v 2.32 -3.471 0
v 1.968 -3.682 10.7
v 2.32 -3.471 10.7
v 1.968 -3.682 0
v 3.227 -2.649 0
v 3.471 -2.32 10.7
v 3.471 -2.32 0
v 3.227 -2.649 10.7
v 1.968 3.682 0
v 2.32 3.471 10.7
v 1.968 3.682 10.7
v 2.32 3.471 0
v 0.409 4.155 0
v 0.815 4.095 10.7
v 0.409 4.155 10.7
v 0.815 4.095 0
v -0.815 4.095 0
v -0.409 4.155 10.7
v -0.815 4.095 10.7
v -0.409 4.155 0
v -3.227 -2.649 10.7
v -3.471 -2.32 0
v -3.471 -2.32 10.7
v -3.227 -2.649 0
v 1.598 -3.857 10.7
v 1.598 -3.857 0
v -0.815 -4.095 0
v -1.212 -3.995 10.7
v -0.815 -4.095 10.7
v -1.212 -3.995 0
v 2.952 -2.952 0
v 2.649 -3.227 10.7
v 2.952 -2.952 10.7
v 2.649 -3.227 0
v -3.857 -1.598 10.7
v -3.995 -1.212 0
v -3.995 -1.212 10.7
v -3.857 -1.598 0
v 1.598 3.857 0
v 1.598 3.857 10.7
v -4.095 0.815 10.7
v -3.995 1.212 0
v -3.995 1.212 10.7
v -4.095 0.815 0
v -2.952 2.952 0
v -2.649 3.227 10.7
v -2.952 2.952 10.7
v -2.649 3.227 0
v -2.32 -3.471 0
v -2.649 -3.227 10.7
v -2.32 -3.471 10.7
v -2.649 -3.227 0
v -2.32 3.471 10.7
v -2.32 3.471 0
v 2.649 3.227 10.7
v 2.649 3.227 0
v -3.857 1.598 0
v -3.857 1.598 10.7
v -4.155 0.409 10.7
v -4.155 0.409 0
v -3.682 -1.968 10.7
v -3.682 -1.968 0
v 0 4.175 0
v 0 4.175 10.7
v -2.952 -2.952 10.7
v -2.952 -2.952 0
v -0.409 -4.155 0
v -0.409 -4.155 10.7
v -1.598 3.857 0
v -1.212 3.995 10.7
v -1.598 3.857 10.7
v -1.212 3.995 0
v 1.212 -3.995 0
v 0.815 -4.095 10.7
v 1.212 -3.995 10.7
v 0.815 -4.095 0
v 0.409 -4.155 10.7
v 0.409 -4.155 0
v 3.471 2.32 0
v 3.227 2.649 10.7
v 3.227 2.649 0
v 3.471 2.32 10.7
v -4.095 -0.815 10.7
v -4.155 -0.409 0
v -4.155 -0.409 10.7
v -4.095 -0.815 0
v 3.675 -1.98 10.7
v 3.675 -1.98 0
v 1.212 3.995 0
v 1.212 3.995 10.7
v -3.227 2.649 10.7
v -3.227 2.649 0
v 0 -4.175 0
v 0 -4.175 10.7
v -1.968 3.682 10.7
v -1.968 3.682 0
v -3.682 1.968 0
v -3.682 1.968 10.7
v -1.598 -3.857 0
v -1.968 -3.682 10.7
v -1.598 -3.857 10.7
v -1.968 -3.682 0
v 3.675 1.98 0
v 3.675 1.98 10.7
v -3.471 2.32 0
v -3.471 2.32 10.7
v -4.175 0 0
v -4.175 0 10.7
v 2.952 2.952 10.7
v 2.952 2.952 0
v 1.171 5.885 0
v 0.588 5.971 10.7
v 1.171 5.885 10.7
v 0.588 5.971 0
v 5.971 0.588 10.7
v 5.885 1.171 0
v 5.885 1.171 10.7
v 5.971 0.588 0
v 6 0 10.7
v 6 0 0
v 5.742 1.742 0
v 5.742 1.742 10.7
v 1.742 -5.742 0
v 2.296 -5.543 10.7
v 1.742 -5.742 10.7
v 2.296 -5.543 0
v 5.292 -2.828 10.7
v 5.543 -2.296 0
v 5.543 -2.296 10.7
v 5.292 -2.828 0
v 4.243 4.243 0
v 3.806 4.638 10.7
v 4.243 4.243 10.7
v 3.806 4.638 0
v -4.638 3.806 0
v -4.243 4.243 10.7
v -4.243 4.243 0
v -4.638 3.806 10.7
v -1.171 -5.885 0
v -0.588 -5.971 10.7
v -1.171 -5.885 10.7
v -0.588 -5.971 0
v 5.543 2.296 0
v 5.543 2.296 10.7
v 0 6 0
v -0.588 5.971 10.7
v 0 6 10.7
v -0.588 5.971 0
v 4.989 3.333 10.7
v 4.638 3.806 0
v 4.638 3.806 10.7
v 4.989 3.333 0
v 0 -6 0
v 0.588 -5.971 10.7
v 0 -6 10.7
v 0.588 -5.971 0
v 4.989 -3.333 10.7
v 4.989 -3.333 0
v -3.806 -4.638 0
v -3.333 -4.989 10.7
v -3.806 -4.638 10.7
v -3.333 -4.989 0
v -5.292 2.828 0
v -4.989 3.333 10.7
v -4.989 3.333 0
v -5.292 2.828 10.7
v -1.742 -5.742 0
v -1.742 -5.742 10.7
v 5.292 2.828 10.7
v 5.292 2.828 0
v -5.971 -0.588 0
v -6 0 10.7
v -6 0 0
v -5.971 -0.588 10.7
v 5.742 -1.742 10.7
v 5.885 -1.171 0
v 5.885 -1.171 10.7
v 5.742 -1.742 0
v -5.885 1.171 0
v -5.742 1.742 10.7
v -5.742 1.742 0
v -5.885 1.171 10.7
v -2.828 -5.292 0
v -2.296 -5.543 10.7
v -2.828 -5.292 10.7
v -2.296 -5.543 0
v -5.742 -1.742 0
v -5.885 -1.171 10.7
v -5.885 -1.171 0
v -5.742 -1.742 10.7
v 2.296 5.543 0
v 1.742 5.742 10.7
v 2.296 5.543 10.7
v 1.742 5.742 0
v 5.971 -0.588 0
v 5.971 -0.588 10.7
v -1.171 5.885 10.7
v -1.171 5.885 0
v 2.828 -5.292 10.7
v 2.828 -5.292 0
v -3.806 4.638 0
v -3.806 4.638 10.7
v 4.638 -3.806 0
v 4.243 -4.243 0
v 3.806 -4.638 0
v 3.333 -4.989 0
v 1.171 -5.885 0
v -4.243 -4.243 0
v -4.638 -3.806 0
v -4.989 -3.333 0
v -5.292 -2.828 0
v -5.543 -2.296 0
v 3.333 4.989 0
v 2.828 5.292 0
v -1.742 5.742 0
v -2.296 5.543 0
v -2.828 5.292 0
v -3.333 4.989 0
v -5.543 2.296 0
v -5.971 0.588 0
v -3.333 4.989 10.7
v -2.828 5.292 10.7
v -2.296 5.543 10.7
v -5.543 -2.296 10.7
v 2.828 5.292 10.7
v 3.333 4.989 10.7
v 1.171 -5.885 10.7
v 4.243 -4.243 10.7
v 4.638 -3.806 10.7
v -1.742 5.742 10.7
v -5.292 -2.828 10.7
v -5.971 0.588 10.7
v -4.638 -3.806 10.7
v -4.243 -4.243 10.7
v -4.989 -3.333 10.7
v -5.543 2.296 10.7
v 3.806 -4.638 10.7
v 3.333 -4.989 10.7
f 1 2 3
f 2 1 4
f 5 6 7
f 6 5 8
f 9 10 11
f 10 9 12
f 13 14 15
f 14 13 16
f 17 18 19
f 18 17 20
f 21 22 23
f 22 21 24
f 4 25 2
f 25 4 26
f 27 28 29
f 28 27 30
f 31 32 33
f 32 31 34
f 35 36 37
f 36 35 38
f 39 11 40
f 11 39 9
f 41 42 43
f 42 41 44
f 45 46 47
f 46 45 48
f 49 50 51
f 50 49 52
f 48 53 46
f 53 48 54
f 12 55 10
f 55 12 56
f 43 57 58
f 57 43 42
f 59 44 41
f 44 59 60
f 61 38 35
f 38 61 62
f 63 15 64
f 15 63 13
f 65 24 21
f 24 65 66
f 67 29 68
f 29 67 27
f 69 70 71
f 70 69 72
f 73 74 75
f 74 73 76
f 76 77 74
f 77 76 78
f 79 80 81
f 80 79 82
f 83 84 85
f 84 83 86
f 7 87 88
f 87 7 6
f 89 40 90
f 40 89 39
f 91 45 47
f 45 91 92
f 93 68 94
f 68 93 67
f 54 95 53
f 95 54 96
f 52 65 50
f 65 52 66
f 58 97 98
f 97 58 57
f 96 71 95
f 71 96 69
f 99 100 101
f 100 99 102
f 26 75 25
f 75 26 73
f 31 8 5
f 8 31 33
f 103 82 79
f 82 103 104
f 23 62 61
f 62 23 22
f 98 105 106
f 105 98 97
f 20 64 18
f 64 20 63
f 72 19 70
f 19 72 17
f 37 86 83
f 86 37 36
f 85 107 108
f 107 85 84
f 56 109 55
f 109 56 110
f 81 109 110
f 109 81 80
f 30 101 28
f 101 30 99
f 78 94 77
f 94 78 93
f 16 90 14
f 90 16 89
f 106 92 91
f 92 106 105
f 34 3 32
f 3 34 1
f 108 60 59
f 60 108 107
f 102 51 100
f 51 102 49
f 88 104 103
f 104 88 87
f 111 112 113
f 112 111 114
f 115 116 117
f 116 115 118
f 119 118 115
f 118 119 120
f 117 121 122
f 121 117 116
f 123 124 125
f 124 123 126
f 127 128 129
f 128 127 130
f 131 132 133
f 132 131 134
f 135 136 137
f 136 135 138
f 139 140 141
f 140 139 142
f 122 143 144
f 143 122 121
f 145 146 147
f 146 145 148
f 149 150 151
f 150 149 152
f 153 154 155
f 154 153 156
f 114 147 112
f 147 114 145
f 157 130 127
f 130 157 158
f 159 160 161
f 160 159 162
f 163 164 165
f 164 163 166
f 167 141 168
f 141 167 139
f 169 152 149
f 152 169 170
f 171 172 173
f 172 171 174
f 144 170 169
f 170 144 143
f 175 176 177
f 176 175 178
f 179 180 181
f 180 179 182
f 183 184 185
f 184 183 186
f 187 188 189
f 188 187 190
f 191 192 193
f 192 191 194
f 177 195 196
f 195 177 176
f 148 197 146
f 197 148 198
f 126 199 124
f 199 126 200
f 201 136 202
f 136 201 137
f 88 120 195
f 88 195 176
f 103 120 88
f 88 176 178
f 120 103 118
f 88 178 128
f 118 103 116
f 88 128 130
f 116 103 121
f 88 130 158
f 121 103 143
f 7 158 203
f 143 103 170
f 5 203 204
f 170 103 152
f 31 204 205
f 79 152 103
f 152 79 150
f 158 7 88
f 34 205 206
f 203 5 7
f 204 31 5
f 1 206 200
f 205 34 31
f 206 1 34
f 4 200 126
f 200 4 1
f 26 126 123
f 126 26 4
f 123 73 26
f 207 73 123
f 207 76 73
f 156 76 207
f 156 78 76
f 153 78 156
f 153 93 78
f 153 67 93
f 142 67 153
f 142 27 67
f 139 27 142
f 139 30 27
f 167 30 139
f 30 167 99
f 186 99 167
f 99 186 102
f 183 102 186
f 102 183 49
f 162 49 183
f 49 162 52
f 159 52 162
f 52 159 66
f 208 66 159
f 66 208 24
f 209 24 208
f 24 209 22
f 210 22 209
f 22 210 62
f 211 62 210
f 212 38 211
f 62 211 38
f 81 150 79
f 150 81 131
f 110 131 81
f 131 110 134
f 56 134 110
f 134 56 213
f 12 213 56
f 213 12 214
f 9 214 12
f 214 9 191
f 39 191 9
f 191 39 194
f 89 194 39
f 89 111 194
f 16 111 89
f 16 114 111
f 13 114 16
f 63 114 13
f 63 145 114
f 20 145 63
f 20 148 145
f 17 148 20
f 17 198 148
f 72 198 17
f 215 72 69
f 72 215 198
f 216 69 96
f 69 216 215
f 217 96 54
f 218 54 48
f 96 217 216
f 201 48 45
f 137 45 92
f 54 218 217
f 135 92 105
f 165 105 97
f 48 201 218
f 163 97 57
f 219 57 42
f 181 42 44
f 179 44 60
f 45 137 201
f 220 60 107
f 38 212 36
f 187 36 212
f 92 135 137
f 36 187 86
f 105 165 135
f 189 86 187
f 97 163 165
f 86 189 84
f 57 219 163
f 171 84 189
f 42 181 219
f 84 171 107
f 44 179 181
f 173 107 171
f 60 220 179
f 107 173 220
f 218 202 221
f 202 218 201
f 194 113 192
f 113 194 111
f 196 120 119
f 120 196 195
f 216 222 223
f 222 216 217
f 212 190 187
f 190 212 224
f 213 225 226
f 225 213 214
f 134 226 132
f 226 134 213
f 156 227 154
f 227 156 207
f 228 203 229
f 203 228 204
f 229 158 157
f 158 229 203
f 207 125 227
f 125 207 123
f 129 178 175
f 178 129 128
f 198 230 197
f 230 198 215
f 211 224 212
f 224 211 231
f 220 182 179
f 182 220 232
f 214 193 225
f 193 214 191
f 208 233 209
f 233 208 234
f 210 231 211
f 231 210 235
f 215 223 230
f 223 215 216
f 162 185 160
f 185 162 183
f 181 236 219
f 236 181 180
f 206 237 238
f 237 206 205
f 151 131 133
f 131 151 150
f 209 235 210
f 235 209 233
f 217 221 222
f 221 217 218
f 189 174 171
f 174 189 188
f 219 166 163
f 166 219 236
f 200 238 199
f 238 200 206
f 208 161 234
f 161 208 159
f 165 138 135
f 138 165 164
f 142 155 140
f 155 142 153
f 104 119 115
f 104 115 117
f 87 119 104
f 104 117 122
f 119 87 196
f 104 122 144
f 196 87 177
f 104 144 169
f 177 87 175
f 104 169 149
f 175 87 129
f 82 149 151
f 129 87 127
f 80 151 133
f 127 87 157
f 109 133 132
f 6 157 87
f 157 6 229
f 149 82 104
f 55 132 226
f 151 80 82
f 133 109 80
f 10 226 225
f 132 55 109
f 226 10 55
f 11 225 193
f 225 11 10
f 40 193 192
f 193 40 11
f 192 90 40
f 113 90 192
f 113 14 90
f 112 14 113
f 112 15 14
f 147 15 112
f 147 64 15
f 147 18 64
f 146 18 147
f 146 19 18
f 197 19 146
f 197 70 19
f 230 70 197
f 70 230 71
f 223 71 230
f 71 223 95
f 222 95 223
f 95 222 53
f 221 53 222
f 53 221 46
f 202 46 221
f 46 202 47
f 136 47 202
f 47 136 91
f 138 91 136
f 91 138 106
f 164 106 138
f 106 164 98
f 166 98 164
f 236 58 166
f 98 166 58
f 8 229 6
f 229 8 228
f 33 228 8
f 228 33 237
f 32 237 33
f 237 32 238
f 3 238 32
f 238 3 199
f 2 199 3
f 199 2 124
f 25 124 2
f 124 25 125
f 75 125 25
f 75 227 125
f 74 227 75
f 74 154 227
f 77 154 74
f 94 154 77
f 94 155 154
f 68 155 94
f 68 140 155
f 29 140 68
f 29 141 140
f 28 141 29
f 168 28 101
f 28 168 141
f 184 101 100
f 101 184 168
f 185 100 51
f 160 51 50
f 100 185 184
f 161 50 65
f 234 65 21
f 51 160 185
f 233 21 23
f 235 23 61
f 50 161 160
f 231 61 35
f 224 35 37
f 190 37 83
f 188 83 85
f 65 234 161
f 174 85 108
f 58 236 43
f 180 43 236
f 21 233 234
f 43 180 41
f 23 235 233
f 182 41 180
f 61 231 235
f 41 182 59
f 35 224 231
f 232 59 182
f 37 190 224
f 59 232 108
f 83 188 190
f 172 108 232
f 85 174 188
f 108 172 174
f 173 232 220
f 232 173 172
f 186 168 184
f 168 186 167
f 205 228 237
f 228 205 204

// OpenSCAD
// file: parameters.scad
// =============================================================================
// Gen-BL — nightly 2026-10-06 (physics_scorer, honest magpylib watts)
// Dense-wind, smaller gap: the wire budget (not the window) limits these machines, so the same ~367 m of 26 AWG is laid layer-by-layer at fill 0.65 into a SHORTER 8.1 mm window (vs 9.0 mm on Gen-BI) with a 17.1 mm build on 29–71 mm sector bobbins. That shrinks the magnet-to-magnet gap 11.6 → 10.7 mm, so every turn sees more flux. Rotors, Ø5 tight-assist map and Ø134 × 4.76 mm steel are identical to Gen-BI (modular: only bobbins, stator and gap sleeve change).
// Clocking 0 deg (magnets N facing S) + D-flat keyed bore + index notch + flip-symmetric hole map.
// Windable 2-piece bobbin; turns = physics_scorer turns_fit; copper only between flanges.
// Steel back-iron: 2× Ø134 × 4.76 mm (3/16") mild-steel discs (steel_backiron_disc.dxf); magnets sit ON the steel
// (through-pockets) -> score with --back-iron.
// =============================================================================
topology            = "dual_rotor";

// --- Wire / winding (physics_scorer winding-fit) -------------------------------
wire_awg            = 26;
wire_od             = 0.45;     // insulated OD mm (bare 0.405)
fill_realistic      = 0.65;     // insulated-wire area / window (DENSE layered wind with a jig; scorer cap 0.65)
turns               = 566;       // = physics_scorer turns_fit (do NOT raise)
coil_former_type    = "bobbin";
coil_core_inset     = 17.10;     // radial copper build: hub = copper boundary inset by this
wind_build_axial    = 0.0;      // nothing proud of the flanges
wind_build_radial   = 0.0;

// --- Bobbin (base + lid) ---------------------------------------------------------
coil_id_r           = 29.00;    // copper boundary sector
coil_od_r           = 71.00;
span_deg            = 52.68;    // = pitch - 2*asin((wall+0.85)/coil_id_r) -> >=1.2 mm stator web
former_web          = 8.10;     // copper height between flanges (TALL copper: steel keeps Bz up)
flange_t            = 0.80;     // >= 0.8 mm FDM wall rule (tall winds push on the flanges)
wall                = 1.00;     // flange lip beyond copper
former_bare_h       = former_web + 2 * flange_t;
coil_envelope_h     = former_bare_h + 2 * wind_build_axial;
tab_w               = 7.0;
tab_len             = 7.0;
tab_h               = former_bare_h / 2;
pin_d               = 1.9;      // 1.75 mm filament locating pin
coil_mount_r        = coil_od_r + 0.2 + 4.0;
lead_y              = 1.6;
lead_slot_w         = 0.9;
lead_groove_d       = 0.6;

// --- Gap -------------------------------------------------------------------------
run_clear           = 0.50;     // rotor face -> flange
gap_spacer_h        = run_clear + wind_build_axial;
m2m                 = coil_envelope_h + 2 * run_clear;   // rotor face to rotor face (= gap_sleeve length)

// --- Stator ----------------------------------------------------------------------
coil_stations       = 6;
bay_clear           = 0.25;
stator_thick        = former_bare_h;                        // bobbins flush both faces
stator_od           = 160;
shaft_clear_stator  = 14.0;     // stator is static; gap sleeve OD 12 spins inside

// --- Rotor(s) --------------------------------------------------------------------
magnet_Br           = 1.43;     // N52
magnet_d_large      = 20.0;
magnet_h_large      = 5.0;      // one O20x5 per pocket
magnet_h_small      = 5.0;      // one O5x5 per pocket
halbach_magnetisation = "diametric"; // O5x5 assist magnets MUST be DIAMETRICALLY magnetised (tangential)
rotor_b_same_axis   = true;     // same-index magnets share one axis: N faces S across the gap
large_pocket_d      = 20.3;
small_pocket_d      = 5.3;
pocket_h            = 5.10;     // THROUGH the carrier: magnet back face sits on the steel disc
large_n             = 8;
R_large             = 50.0;
R_small_inner       = 40.0;
R_small_mid         = 50.0;
R_small_outer       = 60.0;
small_r_list        = [R_small_inner, R_small_mid, R_small_outer];   // O5 pockets between poles
carrier_od          = 134.0;
carrier_thick       = pocket_h;
hub_h               = 12.0;     // > steel_t + insert: radial set-screw clears the steel
hub_od              = 24.0;     // slim hub so the M4 brace rods fit at R~18 inside the coil ring
hub_insert_d        = 4.0;      // M3 heat-set insert, radial, bears on the D-flat
rotor_b_offset_deg  = 0.0;      // CLOCKING: magnets directly opposite
shaft_key           = "dflat";
dflat_depth         = 0.5;      // 8 mm shaft with 0.5 mm flat (7.5 across flat)
index_notch_d       = 3.0;

// --- Steel back-iron (buyable laser-cut) -------------------------------------------
steel_t             = 4.76;      // mild steel thickness (image method ignores it; sized from steel_flux.py so the return path stays well below saturation)
steel_center_hole   = 26.0;     // slips over the rotor hub (OD 24)
steel_od            = carrier_od;   // steel disc OD = rotor carrier OD

// --- Modular MAX interface ----------------------------------------------------------
shaft_bore          = 8.35;
dflat_x             = 4.0 - dflat_depth + (shaft_bore - 8.0) / 2;
bearing_d           = 21.85;
bearing_h           = 7.2;
m3_clear            = 3.5;
bolt_r_inner        = 30.0;     // M3 steel-disc clamp bolts (inside the magnet ring)
bolt_n_inner        = 4;
bolt_inner_angles   = [0, 90, 180, 270];
bolt_r_outer        = 63.0;     // M3 steel-disc clamp bolts (outside the magnet ring)
bolt_outer_angles   = [45, 135, 225, 315];
flange_bolt_r       = 73.0;     // frame rods: OUTSIDE the rotor OD (rotors spin inside them)
flange_bolt_n       = 6;
flange_bolt_offset  = 30.00;    // between coil stations -> never cuts a lead groove/tab
brace_r             = 18.0;
brace_d             = 4.3;      // temporary M4 jack rods (assembly only)
brace_n             = 4;
brace_angles        = [45, 135, 225, 315];          // flip-symmetric

spacer_pad_od       = 14.0;
spacer_pad_id       = m3_clear;
endbell_od          = 160;
endbell_thick       = 8.0;
endbell_shaft_clear = 10.0;
collar_h            = 10.0;
standoff_od         = 9.0;
frame_standoff_h    = run_clear + carrier_thick + hub_h + collar_h + 2.0;
sleeve_od           = 12.0;
plate_max_mm        = 410;

$fn = 64;
// main file
// Gen-BL — gap sleeve: rigid spacer on the shaft BETWEEN the two rotor carriers (passes through the stator
// hole). Length = m2m, so it sets the magnet gap and carries the full magnet pull. Print x1, upright.
include <parameters.scad>;
$fn = 64;
// D-flat keyed bore: flat faces +X (angle 0 = magnet pocket 0 = index notch)
module dflat_bore(h) {
    intersection() {
        cylinder(d=shaft_bore, h=h);
        translate([-shaft_bore, -shaft_bore, 0]) cube([shaft_bore + dflat_x, 2*shaft_bore, h]);
    }
}

difference() {
    cylinder(d=sleeve_od, h=m2m);
    translate([0, 0, -0.1]) dflat_bore(m2m + 0.2);
}
